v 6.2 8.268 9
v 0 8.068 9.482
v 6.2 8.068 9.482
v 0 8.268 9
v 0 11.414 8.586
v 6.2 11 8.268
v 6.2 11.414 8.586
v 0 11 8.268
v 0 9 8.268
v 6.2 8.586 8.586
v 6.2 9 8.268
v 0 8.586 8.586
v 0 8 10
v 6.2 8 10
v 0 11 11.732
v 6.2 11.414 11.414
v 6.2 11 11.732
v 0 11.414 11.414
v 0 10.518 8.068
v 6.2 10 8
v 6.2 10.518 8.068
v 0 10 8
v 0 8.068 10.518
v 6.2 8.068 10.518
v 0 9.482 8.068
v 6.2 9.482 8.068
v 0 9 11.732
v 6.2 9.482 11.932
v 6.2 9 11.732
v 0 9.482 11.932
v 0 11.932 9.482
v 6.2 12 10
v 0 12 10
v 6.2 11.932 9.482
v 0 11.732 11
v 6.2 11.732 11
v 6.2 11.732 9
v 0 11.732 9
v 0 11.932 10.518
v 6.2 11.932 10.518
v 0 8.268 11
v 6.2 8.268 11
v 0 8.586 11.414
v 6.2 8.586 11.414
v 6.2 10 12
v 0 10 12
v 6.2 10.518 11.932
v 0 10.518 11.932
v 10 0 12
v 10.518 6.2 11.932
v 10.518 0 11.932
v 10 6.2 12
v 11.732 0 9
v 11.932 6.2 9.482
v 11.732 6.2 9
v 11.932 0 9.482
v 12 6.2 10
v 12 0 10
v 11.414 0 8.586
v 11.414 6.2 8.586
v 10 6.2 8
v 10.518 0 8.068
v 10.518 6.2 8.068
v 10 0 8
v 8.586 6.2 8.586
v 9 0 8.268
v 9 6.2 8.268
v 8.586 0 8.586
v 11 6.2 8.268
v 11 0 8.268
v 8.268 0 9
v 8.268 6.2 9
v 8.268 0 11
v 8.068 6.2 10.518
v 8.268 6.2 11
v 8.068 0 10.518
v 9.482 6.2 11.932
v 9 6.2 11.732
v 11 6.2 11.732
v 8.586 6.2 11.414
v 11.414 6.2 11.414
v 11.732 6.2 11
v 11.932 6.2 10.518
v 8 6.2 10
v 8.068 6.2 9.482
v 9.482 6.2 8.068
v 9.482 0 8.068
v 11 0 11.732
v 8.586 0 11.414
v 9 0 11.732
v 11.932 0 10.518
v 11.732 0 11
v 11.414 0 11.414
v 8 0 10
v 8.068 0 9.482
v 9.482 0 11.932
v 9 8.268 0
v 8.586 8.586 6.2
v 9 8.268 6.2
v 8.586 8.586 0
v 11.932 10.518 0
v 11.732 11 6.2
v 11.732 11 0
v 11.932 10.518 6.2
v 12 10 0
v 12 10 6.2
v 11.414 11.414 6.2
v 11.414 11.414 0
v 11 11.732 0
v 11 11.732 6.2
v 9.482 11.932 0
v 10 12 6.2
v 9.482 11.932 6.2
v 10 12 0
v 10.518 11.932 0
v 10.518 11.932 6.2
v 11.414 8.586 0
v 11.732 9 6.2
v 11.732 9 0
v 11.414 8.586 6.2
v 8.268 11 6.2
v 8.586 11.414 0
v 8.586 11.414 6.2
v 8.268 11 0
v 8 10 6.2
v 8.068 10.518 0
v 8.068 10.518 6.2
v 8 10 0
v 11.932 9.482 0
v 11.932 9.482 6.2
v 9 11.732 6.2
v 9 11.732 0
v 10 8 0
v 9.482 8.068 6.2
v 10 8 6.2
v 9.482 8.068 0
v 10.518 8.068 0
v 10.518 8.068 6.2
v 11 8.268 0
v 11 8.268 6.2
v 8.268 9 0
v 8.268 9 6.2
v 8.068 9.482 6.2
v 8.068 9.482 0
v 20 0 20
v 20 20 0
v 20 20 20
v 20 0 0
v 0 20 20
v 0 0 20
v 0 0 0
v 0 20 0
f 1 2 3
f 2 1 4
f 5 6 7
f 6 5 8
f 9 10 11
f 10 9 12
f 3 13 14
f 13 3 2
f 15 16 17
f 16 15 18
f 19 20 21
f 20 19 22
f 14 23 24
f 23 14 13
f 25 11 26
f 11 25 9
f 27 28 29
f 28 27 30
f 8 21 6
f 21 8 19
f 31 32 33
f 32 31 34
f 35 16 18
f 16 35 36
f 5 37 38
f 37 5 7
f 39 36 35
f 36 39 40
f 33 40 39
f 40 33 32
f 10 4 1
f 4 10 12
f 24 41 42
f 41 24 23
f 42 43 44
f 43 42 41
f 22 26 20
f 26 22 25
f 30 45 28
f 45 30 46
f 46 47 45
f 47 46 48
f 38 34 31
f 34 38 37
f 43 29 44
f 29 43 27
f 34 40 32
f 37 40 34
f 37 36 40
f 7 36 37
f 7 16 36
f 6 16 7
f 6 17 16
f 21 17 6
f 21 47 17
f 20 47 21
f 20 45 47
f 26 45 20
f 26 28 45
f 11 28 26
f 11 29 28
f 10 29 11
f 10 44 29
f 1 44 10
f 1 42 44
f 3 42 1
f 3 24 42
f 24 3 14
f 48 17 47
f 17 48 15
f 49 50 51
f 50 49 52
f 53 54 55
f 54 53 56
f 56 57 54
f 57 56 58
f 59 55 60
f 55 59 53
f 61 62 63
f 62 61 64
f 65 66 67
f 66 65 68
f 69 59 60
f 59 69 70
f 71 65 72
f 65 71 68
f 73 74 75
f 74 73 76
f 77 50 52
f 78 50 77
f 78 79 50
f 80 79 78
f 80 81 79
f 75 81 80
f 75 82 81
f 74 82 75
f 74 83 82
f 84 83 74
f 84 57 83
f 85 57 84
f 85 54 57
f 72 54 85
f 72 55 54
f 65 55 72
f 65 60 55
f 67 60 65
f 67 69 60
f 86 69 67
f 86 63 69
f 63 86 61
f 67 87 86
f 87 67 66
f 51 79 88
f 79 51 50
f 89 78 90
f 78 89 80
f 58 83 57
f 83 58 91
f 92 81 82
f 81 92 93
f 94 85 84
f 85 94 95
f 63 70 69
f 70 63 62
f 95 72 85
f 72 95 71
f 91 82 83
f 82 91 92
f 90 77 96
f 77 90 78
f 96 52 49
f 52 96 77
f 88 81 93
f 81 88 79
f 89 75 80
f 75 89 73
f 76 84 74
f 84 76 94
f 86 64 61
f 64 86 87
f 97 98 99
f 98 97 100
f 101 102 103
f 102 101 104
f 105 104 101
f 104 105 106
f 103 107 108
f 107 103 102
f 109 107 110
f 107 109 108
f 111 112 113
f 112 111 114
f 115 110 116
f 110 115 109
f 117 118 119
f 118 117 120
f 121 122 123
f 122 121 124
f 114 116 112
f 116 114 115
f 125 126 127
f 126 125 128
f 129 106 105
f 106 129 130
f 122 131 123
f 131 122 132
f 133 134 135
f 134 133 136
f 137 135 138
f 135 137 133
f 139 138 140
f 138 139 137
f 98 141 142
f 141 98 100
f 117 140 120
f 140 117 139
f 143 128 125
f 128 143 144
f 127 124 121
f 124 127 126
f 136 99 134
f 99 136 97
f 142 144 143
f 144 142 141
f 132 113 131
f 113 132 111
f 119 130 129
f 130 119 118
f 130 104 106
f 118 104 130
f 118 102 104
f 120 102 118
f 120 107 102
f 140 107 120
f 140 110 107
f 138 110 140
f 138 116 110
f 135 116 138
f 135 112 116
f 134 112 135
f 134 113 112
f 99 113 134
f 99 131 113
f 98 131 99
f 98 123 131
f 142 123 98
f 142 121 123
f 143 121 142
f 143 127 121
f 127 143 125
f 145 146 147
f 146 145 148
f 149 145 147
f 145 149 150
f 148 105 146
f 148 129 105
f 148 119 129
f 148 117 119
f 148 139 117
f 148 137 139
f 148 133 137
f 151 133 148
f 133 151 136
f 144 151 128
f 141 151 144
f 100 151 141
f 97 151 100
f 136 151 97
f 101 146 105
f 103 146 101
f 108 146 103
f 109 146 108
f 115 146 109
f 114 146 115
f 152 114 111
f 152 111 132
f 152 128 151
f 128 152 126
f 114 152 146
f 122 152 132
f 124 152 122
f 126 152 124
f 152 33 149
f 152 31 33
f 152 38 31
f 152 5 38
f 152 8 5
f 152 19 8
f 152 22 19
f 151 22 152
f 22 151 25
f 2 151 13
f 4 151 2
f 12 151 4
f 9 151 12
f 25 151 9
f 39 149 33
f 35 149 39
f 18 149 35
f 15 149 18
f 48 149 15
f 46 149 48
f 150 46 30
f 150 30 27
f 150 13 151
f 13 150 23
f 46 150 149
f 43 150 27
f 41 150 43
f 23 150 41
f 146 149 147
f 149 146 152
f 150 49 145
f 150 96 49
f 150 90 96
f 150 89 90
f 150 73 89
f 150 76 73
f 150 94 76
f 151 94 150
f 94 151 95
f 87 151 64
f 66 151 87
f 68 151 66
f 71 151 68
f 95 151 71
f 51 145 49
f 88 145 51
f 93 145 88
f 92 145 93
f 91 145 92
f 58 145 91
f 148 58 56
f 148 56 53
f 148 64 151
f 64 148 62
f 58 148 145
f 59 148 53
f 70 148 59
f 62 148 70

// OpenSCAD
// file: ../sharedDims.scad
$fn=180;

/* [Printer] */
printBed            = 200;

/* [Hardware] */
m3InsertD           = 4.0;  //M3 heat-set insert hole -- check your insert's datasheet
m3InsertDepth       = 6.2;  //for a 5.7 mm long insert, plus a little for melt-back
m4InsertD           = 5.0;
m4InsertDepth       = 8.0;

/* [Shaft Adapter] */
adapterDia      = 20;
pinLatOffset    = 6;
numPins         = 2;

//overall
clDist              = 60;

/* [Hopper] */
wallThickness   = 5;
baseThickness   = 8;
hopperWidth     = 100;
hopperHeight    = 100;
hopperDepth     = 60;
hopperConvergeAngle       = 30;
dropHoleSize    = 30;
mountAngle      = 45;
//NEMA17 motor dimensions
shaftSquareDim      = 3;
shaftDia            = 5;
shaftDwidth         = 4.5;
flatLength          = 12;
motorHolePatternX   = 31;
motorHolePatternY   = 31;
motorClearanceCircle= 23;

/* [Singulator] */
singulatorDiameter      = 80;
singulatorExposureAngle = 90;
numHoles                = 4;
caseCutout              = 10;

/* [Funnel] */
topDia              = 40;
exitDia             = 20;
funnelHeight        = 30;

/* [Movable Support] */
supportScrewSize    = 5;
supportThickness    = 6;
cabinetWallThk      = 6;  //cabinet faces (ply or print); the servo mount bolts to the inside of the left panel
cornerBlock         = 20; //printed blocks in the cabinet's vertical corners -- at the base, the tile seam and
                          //the top; every wall screws into them
tileLap             = 16; //where a printed wall's two tiles meet: a half-lap this tall, glued and screwed

//MG90S servo -- typical numbers, measure yours
servoBodyL          = 22.8; //case length, along the ears
servoBodyW          = 12.2;
servoBodyH          = 22.7; //case bottom to case top, not counting the output boss
servoShaftToEnd     = 6.1;  //output shaft centre to the short end of the case
servoEarSpan        = 32.2; //tip to tip of the mounting ears
servoEarHolePitch   = 27.8;
servoEarThk         = 2.5;
servoEarDrop        = 4.0;  //case top down to the top face of the ears
servoWallClear      = 1.2;  //air between the servo's wall-side ear and the inside of the cabinet wall
//distance from the outside wall of the box to the servo's axis: the wall, then as far as the
//wall-side ear reaches from the shaft (half the ear span, less the case centre's offset
//behind the shaft), then the clearance. It has to come after the servo numbers it uses.
servoBackset        = cabinetWallThk + (servoEarSpan/2 - (servoBodyL/2 - servoShaftToEnd)) + servoWallClear;

//stack spacing down the drop axis
dropToFunnelRim     = 18;   //discharge exit down to the funnel's top rim
funnelToCoil        = 15;   //funnel exit down to the centre of the coil
maxCaseLen          = 69.2; //the longest case it takes (.338 Lapua Mag); shorter ones ride up the thumbscrew
funnelToCase        = maxCaseLen + 7;   //funnel exit down to the thumbscrew head at its lowest: the longest
                                        //case, with its mouth clear of the funnel
caseToArm           = 16;   //thumbscrew head at its lowest down to the top face of the horn arm

/* [Heatsink Holder] */
//induction heater heatsinks -- the pair on the heatsink holder, inside the cabinet; the coil's
//leads come through the wall and plug into them, and the transformer's cables leave the far end
heatsinkSpacing     = 20;   //between their flat faces: the holder's width across them
heatsinkH           = 54;   //overall, across the fins
heatsinkFinReach    = 5.25; //the fins stand this far proud of the flat face, toward the holder
heatsinkDepth       = 18.5; //flat face out to the back of the curved base (round, not square -- see layout)
heatsinkLen         = 38;   //extrusion length, the same as the holder
heatsinkBoreIn      = 7;    //the coil's lead plugs in this far in from the flat face, at mid-height

//the driver board's fan -- a standard 40 x 20
driverFanSize       = 40;   //square
driverFanDepth      = 20;
driverFanHolePitch  = 32;   //between its screw holes (M3)

//induction coil leads, where they pass through the cabinet wall
coilTube            = 4;    //copper tube OD
leadGap             = heatsinkSpacing + 2*heatsinkBoreIn;   //centre-to-centre: the heatsinks' lead bores
grommetLip          = 2.5;  //the pass-through is grown by this for the grommet
wallBackset         = 45;
// main file
include <../sharedDims.scad>

// Corner block for the cabinet: twelve of them, in the four vertical corners
// at the base, across the tile seam and under the lid (placed by
// boxLayout.scad). Every face screws into them with an M3 through the face
// into a heat-set insert in the middle of the block's face against it. The
// inserts are in three faces round one corner, so turned the right way the
// same block fits every place -- the two walls it sits against, and the base
// or lid for the bottom and top ones (the seam ones just leave that one
// empty). The seam ones sit centred on the seam, so their screws come in
// through the half-lap.
//
// Frame: the corner the insert faces meet at is the origin; the block runs
// +x, +y, +z from it. Prints on any face.

// Wrapped as a module so assembly/assembly.scad can place it.
module cornerBlock() {
    c = cornerBlock;
    difference() {
        cube(c);
        //inserts: into the x = 0, y = 0 and z = 0 faces, at their middles
        for (r = [[0, 90, 0], [-90, 0, 0], [0, 0, 0]])
            translate([c/2, c/2, c/2]) rotate(r) translate([0, 0, -c/2 - 0.01])
                cylinder(d=m3InsertD, h=m3InsertDepth + 0.01, $fn=24);
    }
}

cornerBlock();
